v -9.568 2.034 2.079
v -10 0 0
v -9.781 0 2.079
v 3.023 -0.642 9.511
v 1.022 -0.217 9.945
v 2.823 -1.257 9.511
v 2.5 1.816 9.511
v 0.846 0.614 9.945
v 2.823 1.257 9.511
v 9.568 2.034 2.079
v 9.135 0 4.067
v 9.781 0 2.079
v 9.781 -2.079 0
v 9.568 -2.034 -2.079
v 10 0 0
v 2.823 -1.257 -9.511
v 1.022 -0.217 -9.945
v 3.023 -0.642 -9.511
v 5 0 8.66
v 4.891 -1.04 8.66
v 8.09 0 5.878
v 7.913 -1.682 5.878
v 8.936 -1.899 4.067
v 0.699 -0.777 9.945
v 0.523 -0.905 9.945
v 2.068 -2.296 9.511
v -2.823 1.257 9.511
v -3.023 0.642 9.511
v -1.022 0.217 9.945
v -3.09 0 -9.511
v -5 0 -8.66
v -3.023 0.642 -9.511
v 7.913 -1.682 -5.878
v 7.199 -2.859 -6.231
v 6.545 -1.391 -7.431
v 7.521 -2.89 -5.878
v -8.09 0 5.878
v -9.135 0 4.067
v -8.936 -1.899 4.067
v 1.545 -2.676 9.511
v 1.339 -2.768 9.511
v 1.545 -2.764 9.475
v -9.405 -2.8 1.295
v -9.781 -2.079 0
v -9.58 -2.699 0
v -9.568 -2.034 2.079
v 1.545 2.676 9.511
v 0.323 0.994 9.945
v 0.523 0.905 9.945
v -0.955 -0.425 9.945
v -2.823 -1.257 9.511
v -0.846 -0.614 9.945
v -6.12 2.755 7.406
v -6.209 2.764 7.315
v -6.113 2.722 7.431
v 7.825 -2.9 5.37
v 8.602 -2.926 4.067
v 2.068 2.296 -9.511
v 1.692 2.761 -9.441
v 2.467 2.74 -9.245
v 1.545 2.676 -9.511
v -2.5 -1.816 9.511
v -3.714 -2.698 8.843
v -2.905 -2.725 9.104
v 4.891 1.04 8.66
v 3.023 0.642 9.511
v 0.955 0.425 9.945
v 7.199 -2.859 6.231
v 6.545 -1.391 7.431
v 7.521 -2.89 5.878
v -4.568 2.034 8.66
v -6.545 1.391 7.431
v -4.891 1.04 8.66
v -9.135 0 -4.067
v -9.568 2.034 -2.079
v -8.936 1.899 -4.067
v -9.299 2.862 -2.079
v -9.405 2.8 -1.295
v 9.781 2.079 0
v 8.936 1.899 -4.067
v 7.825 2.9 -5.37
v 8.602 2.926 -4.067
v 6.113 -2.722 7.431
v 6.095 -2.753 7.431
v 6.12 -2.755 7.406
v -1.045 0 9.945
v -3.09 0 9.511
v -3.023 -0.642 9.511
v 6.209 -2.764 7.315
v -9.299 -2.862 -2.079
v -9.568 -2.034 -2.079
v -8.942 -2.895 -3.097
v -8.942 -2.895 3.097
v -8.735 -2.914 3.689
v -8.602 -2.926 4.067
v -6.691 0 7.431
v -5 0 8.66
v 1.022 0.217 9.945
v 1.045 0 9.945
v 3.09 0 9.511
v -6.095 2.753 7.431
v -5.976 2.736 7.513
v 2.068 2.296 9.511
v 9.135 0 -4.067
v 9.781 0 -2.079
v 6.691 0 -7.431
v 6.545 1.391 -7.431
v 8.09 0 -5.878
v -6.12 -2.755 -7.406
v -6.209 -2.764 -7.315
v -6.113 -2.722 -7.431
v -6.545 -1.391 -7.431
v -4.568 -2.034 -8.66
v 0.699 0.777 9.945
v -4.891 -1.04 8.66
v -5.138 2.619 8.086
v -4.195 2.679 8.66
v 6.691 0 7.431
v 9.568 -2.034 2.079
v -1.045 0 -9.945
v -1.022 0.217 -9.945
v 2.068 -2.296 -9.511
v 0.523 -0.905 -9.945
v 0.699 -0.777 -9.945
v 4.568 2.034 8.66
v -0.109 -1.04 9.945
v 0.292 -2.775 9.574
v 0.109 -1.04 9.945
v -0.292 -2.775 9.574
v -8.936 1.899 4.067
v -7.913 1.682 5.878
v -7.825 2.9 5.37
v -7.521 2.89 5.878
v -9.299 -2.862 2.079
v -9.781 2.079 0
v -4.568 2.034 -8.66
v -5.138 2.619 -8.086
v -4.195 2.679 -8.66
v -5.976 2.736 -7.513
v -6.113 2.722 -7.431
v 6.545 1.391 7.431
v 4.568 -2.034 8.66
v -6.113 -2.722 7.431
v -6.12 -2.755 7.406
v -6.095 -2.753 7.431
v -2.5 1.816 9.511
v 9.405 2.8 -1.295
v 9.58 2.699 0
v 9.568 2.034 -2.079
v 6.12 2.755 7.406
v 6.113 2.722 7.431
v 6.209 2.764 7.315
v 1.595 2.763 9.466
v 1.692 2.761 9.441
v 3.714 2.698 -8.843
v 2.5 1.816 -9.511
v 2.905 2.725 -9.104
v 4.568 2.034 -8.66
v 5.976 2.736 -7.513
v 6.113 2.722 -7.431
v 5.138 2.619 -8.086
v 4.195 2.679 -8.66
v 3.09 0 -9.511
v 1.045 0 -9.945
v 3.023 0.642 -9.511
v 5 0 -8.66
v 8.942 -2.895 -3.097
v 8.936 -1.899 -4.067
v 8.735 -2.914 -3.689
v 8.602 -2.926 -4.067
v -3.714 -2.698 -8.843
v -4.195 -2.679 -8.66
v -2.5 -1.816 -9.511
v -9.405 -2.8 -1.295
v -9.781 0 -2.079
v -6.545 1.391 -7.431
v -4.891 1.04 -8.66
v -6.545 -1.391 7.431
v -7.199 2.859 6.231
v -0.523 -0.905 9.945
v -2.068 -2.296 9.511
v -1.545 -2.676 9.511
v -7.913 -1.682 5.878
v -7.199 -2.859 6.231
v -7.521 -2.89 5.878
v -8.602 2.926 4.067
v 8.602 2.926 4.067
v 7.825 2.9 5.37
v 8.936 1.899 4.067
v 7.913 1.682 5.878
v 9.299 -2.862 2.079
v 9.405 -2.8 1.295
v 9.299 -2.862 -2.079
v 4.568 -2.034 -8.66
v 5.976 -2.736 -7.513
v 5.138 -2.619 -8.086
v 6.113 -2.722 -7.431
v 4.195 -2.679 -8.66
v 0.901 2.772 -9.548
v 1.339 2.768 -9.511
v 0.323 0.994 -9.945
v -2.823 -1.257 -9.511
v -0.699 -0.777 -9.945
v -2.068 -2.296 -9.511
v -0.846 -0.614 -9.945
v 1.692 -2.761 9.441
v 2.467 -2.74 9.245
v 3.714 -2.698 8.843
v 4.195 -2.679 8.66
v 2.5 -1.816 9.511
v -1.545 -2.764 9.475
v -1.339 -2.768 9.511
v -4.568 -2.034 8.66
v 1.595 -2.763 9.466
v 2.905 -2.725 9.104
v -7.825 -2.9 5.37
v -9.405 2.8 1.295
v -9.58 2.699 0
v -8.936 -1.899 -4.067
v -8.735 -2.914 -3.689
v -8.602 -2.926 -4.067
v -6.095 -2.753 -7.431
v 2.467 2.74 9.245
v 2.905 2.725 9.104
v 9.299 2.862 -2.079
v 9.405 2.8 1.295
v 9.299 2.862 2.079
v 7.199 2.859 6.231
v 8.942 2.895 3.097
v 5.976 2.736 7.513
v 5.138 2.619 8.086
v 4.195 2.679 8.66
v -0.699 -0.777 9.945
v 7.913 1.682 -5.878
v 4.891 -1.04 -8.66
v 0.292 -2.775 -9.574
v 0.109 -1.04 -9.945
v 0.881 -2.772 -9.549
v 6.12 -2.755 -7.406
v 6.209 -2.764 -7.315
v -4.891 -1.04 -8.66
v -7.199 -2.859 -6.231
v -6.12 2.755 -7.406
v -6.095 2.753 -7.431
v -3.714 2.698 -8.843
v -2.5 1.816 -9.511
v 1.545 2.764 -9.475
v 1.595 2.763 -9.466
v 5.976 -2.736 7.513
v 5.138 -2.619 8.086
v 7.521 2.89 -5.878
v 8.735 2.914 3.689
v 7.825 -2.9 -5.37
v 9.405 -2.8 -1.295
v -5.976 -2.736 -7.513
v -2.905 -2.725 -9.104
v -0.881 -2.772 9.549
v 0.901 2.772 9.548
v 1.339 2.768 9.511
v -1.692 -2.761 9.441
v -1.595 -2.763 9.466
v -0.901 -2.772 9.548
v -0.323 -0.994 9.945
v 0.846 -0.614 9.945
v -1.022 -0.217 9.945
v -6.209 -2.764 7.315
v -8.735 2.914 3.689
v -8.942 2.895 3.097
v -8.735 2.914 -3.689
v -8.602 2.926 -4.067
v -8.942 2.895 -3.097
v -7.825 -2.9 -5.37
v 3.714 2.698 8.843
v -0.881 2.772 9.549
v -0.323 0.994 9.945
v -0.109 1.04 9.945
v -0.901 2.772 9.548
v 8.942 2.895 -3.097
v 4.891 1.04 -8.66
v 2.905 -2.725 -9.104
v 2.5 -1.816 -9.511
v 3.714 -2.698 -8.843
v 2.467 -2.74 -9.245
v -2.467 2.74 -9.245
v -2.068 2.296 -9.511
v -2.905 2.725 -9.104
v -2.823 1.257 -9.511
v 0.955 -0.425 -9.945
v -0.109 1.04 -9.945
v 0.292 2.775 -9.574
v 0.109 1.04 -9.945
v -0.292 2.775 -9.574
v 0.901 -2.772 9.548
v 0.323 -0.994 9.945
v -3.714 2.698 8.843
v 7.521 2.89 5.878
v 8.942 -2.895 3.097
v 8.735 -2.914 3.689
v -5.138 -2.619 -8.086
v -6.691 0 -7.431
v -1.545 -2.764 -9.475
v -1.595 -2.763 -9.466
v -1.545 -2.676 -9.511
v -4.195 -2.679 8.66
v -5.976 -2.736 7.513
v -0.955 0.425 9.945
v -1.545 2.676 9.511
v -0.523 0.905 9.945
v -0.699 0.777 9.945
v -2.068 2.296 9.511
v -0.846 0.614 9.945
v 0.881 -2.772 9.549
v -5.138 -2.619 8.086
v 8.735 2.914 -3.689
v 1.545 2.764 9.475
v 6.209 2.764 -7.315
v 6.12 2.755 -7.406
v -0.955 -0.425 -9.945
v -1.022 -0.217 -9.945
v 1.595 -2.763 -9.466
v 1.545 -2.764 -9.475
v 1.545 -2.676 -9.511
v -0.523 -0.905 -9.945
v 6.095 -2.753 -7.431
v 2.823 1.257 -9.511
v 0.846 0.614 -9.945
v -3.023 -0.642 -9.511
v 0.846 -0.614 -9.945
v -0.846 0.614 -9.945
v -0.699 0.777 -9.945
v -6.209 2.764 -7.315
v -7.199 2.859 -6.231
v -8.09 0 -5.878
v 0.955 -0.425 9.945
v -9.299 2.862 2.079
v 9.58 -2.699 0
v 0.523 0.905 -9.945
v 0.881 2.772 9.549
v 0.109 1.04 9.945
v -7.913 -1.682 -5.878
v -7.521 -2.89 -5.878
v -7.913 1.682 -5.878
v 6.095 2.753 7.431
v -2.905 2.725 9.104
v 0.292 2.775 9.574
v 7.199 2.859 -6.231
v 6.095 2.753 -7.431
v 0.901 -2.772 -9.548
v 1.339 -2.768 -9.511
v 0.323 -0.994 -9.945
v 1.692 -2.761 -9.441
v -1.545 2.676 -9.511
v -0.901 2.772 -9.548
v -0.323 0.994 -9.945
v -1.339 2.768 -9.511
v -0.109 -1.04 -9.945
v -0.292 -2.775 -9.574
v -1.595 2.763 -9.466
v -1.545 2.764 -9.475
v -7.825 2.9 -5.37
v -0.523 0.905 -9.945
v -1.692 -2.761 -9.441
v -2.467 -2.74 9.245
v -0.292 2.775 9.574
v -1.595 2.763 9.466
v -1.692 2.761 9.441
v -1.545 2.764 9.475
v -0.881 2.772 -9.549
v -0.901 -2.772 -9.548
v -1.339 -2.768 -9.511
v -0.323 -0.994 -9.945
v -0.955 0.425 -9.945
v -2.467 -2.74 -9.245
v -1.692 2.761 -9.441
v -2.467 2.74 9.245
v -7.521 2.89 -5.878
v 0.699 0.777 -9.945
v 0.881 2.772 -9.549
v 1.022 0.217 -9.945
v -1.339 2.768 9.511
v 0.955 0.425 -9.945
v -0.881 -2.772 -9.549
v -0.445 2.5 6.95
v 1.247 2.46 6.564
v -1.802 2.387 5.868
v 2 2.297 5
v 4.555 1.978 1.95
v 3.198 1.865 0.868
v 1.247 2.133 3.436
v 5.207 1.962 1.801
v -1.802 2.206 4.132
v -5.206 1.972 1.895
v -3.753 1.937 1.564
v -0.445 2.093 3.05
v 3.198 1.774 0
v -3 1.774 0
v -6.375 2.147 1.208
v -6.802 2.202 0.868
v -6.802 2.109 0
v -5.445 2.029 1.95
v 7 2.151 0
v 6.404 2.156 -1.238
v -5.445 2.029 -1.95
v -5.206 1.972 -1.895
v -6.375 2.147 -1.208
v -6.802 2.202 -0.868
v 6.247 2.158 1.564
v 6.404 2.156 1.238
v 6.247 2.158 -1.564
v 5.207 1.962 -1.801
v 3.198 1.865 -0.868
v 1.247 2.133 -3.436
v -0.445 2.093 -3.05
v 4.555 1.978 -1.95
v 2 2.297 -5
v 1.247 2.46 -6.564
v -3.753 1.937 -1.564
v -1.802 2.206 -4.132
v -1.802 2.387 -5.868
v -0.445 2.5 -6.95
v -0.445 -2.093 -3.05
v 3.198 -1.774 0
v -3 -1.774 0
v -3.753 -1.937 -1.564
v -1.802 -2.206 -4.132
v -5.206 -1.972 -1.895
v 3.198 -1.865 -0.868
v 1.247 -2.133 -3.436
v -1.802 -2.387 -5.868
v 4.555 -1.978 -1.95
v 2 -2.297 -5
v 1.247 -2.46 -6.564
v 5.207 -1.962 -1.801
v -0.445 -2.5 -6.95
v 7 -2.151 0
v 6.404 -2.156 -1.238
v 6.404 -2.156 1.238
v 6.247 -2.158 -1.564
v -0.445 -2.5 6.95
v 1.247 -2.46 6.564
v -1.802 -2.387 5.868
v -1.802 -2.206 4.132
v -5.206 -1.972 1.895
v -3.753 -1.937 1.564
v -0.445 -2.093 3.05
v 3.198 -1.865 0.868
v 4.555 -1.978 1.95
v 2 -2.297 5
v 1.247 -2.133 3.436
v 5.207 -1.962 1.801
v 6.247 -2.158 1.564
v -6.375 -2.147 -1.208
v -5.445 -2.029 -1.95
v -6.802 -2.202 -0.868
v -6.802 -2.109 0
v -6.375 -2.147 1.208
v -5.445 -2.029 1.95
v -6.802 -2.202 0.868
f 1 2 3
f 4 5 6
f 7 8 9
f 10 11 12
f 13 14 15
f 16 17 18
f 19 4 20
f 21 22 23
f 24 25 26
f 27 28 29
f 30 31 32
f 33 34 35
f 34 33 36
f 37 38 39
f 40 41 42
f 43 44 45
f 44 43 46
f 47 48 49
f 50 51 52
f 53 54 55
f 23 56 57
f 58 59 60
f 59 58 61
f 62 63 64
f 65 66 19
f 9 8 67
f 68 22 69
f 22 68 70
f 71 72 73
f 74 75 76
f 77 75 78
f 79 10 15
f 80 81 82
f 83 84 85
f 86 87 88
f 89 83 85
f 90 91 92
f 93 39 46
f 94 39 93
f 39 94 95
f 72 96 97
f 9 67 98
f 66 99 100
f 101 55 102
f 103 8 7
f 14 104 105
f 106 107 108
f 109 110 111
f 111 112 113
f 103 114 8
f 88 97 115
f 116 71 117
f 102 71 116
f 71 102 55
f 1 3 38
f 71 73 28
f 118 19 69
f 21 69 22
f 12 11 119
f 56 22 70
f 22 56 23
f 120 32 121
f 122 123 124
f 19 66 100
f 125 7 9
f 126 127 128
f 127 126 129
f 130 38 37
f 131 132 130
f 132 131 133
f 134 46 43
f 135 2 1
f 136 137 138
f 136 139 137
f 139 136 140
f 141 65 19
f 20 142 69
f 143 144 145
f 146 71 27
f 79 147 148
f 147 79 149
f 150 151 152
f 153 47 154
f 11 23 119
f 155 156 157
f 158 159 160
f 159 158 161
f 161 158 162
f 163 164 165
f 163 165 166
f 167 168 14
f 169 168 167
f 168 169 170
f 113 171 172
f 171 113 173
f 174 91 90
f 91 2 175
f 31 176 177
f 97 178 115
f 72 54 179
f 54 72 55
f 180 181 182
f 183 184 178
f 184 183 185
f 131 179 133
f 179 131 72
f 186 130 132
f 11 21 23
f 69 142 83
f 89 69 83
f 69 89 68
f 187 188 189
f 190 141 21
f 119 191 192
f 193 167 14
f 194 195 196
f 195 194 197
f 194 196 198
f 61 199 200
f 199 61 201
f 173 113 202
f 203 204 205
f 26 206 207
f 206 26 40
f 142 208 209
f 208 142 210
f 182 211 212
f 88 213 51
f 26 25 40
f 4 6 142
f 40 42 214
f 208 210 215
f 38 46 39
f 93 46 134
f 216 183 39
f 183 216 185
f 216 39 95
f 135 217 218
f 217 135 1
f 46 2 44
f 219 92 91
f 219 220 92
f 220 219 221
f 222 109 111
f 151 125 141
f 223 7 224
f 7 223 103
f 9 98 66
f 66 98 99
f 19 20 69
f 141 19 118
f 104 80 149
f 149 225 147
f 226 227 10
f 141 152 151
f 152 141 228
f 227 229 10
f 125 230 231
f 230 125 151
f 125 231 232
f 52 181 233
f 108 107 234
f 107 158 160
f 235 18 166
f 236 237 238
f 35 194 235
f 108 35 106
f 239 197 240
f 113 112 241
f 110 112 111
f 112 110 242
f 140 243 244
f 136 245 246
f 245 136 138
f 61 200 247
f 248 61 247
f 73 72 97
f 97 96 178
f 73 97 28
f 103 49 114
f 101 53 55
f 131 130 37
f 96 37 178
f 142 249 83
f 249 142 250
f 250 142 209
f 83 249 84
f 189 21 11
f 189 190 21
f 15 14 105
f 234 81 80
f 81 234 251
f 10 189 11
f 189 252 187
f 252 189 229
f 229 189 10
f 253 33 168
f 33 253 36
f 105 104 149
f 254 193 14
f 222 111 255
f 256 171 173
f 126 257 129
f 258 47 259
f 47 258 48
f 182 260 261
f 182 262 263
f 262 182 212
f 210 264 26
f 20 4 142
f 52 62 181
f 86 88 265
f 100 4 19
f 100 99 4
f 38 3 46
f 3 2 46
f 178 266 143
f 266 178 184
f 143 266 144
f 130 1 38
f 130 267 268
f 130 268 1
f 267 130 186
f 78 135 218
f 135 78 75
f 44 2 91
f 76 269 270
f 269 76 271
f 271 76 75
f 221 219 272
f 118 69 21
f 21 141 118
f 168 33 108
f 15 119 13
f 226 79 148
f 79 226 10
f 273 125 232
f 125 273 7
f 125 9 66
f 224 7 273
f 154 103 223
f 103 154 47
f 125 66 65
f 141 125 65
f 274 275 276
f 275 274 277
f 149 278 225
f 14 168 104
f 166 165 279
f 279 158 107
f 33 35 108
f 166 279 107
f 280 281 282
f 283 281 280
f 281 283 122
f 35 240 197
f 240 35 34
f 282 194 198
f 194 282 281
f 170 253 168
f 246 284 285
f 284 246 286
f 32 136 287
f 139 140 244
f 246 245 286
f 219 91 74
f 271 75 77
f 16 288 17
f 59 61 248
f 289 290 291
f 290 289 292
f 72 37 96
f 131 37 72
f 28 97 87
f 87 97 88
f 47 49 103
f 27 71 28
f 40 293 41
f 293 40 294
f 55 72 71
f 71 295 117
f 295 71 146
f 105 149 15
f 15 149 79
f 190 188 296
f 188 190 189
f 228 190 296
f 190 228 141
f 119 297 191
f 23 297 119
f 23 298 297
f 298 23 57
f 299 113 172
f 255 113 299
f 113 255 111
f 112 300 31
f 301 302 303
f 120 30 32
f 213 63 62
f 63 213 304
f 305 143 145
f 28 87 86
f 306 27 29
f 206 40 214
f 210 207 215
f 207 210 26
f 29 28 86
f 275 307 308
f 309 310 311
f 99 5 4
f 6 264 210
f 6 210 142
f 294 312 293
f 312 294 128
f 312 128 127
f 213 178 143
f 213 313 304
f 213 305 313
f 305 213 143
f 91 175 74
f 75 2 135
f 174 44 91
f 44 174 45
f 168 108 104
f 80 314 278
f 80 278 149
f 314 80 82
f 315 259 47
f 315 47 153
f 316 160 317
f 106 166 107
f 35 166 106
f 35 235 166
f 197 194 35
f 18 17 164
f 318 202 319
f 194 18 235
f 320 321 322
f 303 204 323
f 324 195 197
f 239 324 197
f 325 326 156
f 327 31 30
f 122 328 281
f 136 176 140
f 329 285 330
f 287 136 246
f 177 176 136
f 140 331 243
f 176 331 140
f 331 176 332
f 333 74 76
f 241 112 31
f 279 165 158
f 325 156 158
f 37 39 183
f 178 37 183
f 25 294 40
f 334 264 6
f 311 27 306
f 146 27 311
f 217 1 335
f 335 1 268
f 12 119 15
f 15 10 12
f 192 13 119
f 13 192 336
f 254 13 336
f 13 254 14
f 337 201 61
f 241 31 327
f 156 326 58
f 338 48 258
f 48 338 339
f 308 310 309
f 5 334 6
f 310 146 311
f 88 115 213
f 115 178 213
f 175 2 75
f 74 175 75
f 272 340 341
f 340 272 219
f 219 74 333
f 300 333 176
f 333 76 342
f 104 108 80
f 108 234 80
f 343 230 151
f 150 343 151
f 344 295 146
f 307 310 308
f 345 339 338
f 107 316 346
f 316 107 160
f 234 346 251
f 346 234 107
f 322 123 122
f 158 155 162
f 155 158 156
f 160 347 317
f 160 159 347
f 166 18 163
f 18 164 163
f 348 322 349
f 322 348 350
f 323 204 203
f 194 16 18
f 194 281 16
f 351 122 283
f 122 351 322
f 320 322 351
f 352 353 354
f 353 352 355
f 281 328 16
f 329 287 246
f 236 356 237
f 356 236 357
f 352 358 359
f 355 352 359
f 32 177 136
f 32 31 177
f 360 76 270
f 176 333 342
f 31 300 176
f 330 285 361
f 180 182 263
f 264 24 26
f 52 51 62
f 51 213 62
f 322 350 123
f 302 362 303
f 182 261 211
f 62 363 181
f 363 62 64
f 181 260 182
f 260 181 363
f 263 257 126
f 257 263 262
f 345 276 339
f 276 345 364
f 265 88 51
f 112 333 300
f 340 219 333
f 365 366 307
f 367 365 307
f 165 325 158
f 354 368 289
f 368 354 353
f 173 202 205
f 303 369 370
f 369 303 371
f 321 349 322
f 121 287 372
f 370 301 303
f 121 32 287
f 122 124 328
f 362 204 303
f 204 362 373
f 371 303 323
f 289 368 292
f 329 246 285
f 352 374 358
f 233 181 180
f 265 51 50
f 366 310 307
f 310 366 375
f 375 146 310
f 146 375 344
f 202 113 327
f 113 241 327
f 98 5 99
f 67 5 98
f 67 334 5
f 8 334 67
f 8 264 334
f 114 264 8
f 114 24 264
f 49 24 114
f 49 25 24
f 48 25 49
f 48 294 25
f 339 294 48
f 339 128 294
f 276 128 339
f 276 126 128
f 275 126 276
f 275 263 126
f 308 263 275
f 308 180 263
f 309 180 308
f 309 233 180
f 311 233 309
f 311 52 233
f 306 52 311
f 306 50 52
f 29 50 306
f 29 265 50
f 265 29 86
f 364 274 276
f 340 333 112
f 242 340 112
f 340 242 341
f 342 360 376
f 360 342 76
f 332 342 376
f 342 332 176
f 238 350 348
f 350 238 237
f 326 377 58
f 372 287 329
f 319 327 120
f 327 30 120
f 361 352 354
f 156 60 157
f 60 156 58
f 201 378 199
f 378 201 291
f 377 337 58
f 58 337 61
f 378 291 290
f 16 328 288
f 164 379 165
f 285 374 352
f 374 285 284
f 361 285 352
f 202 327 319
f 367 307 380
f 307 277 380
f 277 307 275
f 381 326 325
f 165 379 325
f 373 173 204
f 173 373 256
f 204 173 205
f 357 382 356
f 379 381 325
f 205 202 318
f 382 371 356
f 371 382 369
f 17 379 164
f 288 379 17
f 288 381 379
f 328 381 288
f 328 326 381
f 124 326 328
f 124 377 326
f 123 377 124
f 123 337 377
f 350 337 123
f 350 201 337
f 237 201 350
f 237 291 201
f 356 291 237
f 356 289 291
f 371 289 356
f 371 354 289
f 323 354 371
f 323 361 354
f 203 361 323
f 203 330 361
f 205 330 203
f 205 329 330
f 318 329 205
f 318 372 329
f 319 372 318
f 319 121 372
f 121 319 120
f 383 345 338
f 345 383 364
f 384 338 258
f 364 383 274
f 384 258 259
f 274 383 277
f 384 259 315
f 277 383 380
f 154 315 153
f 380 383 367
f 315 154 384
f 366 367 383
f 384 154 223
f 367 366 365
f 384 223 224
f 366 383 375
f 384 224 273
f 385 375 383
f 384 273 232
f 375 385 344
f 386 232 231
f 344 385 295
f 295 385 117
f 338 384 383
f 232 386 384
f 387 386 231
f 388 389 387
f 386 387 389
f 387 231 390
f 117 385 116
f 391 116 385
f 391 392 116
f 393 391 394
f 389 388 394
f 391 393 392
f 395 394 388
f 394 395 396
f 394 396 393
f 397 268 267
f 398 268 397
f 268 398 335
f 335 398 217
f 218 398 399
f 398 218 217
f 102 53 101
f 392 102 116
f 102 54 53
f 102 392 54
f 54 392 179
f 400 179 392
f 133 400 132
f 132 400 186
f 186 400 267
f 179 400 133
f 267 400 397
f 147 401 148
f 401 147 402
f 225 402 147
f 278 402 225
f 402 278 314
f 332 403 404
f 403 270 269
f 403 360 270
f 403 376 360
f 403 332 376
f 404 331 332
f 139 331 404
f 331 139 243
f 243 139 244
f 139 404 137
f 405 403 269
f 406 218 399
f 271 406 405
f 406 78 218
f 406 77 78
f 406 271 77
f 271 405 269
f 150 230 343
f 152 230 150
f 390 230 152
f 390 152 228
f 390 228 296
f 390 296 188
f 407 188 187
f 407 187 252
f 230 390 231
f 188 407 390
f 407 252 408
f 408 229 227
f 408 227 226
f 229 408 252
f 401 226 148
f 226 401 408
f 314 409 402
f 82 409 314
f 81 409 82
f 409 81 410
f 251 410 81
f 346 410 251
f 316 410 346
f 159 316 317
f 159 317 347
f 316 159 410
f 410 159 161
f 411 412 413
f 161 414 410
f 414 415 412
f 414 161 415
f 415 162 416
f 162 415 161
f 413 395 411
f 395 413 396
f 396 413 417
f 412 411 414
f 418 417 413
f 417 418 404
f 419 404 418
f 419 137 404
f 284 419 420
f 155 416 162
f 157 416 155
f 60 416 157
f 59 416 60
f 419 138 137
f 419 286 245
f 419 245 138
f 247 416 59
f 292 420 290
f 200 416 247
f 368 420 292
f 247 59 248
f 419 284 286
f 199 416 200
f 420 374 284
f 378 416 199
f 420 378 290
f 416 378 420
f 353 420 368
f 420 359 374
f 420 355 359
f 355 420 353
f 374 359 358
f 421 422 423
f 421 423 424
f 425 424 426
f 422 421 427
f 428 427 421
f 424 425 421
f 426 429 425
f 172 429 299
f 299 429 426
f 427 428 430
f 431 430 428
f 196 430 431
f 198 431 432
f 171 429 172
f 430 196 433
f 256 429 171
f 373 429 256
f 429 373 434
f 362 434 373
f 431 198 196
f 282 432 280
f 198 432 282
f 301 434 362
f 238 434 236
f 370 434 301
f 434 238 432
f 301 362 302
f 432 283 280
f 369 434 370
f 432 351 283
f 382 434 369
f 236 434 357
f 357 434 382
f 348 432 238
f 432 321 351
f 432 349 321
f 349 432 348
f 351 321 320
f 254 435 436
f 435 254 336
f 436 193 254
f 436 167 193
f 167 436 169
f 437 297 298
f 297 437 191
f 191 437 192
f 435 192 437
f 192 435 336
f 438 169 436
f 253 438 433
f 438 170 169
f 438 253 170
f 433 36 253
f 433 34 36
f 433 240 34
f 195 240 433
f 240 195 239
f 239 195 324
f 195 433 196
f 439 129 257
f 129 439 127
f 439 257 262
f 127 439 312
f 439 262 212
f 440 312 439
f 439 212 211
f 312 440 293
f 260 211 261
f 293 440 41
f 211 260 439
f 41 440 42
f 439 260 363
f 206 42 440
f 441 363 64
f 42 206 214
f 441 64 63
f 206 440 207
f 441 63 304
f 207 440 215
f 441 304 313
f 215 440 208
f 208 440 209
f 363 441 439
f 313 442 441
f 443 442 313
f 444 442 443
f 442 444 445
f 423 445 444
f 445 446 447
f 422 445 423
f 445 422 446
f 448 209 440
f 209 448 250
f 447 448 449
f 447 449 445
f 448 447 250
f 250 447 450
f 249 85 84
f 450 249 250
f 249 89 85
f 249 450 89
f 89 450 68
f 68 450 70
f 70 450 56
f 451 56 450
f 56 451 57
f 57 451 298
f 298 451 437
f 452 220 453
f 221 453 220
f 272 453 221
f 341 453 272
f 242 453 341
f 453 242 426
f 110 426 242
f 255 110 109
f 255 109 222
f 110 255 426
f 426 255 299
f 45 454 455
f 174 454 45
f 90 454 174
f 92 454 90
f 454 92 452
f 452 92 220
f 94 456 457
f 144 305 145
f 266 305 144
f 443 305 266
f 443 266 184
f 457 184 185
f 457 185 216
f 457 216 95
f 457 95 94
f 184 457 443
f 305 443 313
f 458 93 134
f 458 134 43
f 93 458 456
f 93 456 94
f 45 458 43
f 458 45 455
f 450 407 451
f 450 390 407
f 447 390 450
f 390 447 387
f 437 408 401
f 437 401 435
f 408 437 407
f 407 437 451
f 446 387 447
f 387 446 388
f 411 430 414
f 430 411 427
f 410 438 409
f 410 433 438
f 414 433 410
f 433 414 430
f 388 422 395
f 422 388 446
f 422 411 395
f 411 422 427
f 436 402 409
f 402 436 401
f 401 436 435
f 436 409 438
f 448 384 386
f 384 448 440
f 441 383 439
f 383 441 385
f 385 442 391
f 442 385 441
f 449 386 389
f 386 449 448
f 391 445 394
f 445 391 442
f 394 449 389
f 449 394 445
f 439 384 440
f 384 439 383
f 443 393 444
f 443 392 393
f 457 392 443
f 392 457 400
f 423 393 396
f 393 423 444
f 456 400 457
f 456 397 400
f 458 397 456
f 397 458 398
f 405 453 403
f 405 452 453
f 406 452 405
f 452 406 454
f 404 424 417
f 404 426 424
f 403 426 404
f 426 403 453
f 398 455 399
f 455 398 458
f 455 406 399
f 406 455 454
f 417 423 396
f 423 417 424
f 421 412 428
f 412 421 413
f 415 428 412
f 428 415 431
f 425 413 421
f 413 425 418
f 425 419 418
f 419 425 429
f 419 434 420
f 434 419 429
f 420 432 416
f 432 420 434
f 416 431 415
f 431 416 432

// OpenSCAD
module wheel(wheel_radius, side_spheres_radius, hub_thickness, cylinder_radius) {
    cylinder_height=2*wheel_radius;
    difference() {
        // Wheel sphere
        sphere(r=wheel_radius);
        // Side sphere 1
        translate([0,side_spheres_radius + hub_thickness/2,0])
            sphere(r=side_spheres_radius);
        // Side sphere 2
        translate([0,- (side_spheres_radius + hub_thickness/2),0])
            sphere(r=side_spheres_radius);
        // Cylinder 1
        translate([wheel_radius/2,0,0])
            rotate([90,0,0])
            cylinder(h=cylinder_height,r=cylinder_radius,center=true);
        // Cylinder 2
        translate([0,0,wheel_radius/2])
            rotate([90,0,0])
            cylinder(h=cylinder_height,r=cylinder_radius,center=true);
        // Cylinder 3
        translate([-wheel_radius/2,0,0])
            rotate([90,0,0])
            cylinder(h=cylinder_height,r=cylinder_radius,center=true);
        // Cylinder 4
        translate([0,0,-wheel_radius/2])
            rotate([90,0,0])
            cylinder(h=cylinder_height,r=cylinder_radius,center=true);
    }
}
wheel(10, 50, 3, 2);
